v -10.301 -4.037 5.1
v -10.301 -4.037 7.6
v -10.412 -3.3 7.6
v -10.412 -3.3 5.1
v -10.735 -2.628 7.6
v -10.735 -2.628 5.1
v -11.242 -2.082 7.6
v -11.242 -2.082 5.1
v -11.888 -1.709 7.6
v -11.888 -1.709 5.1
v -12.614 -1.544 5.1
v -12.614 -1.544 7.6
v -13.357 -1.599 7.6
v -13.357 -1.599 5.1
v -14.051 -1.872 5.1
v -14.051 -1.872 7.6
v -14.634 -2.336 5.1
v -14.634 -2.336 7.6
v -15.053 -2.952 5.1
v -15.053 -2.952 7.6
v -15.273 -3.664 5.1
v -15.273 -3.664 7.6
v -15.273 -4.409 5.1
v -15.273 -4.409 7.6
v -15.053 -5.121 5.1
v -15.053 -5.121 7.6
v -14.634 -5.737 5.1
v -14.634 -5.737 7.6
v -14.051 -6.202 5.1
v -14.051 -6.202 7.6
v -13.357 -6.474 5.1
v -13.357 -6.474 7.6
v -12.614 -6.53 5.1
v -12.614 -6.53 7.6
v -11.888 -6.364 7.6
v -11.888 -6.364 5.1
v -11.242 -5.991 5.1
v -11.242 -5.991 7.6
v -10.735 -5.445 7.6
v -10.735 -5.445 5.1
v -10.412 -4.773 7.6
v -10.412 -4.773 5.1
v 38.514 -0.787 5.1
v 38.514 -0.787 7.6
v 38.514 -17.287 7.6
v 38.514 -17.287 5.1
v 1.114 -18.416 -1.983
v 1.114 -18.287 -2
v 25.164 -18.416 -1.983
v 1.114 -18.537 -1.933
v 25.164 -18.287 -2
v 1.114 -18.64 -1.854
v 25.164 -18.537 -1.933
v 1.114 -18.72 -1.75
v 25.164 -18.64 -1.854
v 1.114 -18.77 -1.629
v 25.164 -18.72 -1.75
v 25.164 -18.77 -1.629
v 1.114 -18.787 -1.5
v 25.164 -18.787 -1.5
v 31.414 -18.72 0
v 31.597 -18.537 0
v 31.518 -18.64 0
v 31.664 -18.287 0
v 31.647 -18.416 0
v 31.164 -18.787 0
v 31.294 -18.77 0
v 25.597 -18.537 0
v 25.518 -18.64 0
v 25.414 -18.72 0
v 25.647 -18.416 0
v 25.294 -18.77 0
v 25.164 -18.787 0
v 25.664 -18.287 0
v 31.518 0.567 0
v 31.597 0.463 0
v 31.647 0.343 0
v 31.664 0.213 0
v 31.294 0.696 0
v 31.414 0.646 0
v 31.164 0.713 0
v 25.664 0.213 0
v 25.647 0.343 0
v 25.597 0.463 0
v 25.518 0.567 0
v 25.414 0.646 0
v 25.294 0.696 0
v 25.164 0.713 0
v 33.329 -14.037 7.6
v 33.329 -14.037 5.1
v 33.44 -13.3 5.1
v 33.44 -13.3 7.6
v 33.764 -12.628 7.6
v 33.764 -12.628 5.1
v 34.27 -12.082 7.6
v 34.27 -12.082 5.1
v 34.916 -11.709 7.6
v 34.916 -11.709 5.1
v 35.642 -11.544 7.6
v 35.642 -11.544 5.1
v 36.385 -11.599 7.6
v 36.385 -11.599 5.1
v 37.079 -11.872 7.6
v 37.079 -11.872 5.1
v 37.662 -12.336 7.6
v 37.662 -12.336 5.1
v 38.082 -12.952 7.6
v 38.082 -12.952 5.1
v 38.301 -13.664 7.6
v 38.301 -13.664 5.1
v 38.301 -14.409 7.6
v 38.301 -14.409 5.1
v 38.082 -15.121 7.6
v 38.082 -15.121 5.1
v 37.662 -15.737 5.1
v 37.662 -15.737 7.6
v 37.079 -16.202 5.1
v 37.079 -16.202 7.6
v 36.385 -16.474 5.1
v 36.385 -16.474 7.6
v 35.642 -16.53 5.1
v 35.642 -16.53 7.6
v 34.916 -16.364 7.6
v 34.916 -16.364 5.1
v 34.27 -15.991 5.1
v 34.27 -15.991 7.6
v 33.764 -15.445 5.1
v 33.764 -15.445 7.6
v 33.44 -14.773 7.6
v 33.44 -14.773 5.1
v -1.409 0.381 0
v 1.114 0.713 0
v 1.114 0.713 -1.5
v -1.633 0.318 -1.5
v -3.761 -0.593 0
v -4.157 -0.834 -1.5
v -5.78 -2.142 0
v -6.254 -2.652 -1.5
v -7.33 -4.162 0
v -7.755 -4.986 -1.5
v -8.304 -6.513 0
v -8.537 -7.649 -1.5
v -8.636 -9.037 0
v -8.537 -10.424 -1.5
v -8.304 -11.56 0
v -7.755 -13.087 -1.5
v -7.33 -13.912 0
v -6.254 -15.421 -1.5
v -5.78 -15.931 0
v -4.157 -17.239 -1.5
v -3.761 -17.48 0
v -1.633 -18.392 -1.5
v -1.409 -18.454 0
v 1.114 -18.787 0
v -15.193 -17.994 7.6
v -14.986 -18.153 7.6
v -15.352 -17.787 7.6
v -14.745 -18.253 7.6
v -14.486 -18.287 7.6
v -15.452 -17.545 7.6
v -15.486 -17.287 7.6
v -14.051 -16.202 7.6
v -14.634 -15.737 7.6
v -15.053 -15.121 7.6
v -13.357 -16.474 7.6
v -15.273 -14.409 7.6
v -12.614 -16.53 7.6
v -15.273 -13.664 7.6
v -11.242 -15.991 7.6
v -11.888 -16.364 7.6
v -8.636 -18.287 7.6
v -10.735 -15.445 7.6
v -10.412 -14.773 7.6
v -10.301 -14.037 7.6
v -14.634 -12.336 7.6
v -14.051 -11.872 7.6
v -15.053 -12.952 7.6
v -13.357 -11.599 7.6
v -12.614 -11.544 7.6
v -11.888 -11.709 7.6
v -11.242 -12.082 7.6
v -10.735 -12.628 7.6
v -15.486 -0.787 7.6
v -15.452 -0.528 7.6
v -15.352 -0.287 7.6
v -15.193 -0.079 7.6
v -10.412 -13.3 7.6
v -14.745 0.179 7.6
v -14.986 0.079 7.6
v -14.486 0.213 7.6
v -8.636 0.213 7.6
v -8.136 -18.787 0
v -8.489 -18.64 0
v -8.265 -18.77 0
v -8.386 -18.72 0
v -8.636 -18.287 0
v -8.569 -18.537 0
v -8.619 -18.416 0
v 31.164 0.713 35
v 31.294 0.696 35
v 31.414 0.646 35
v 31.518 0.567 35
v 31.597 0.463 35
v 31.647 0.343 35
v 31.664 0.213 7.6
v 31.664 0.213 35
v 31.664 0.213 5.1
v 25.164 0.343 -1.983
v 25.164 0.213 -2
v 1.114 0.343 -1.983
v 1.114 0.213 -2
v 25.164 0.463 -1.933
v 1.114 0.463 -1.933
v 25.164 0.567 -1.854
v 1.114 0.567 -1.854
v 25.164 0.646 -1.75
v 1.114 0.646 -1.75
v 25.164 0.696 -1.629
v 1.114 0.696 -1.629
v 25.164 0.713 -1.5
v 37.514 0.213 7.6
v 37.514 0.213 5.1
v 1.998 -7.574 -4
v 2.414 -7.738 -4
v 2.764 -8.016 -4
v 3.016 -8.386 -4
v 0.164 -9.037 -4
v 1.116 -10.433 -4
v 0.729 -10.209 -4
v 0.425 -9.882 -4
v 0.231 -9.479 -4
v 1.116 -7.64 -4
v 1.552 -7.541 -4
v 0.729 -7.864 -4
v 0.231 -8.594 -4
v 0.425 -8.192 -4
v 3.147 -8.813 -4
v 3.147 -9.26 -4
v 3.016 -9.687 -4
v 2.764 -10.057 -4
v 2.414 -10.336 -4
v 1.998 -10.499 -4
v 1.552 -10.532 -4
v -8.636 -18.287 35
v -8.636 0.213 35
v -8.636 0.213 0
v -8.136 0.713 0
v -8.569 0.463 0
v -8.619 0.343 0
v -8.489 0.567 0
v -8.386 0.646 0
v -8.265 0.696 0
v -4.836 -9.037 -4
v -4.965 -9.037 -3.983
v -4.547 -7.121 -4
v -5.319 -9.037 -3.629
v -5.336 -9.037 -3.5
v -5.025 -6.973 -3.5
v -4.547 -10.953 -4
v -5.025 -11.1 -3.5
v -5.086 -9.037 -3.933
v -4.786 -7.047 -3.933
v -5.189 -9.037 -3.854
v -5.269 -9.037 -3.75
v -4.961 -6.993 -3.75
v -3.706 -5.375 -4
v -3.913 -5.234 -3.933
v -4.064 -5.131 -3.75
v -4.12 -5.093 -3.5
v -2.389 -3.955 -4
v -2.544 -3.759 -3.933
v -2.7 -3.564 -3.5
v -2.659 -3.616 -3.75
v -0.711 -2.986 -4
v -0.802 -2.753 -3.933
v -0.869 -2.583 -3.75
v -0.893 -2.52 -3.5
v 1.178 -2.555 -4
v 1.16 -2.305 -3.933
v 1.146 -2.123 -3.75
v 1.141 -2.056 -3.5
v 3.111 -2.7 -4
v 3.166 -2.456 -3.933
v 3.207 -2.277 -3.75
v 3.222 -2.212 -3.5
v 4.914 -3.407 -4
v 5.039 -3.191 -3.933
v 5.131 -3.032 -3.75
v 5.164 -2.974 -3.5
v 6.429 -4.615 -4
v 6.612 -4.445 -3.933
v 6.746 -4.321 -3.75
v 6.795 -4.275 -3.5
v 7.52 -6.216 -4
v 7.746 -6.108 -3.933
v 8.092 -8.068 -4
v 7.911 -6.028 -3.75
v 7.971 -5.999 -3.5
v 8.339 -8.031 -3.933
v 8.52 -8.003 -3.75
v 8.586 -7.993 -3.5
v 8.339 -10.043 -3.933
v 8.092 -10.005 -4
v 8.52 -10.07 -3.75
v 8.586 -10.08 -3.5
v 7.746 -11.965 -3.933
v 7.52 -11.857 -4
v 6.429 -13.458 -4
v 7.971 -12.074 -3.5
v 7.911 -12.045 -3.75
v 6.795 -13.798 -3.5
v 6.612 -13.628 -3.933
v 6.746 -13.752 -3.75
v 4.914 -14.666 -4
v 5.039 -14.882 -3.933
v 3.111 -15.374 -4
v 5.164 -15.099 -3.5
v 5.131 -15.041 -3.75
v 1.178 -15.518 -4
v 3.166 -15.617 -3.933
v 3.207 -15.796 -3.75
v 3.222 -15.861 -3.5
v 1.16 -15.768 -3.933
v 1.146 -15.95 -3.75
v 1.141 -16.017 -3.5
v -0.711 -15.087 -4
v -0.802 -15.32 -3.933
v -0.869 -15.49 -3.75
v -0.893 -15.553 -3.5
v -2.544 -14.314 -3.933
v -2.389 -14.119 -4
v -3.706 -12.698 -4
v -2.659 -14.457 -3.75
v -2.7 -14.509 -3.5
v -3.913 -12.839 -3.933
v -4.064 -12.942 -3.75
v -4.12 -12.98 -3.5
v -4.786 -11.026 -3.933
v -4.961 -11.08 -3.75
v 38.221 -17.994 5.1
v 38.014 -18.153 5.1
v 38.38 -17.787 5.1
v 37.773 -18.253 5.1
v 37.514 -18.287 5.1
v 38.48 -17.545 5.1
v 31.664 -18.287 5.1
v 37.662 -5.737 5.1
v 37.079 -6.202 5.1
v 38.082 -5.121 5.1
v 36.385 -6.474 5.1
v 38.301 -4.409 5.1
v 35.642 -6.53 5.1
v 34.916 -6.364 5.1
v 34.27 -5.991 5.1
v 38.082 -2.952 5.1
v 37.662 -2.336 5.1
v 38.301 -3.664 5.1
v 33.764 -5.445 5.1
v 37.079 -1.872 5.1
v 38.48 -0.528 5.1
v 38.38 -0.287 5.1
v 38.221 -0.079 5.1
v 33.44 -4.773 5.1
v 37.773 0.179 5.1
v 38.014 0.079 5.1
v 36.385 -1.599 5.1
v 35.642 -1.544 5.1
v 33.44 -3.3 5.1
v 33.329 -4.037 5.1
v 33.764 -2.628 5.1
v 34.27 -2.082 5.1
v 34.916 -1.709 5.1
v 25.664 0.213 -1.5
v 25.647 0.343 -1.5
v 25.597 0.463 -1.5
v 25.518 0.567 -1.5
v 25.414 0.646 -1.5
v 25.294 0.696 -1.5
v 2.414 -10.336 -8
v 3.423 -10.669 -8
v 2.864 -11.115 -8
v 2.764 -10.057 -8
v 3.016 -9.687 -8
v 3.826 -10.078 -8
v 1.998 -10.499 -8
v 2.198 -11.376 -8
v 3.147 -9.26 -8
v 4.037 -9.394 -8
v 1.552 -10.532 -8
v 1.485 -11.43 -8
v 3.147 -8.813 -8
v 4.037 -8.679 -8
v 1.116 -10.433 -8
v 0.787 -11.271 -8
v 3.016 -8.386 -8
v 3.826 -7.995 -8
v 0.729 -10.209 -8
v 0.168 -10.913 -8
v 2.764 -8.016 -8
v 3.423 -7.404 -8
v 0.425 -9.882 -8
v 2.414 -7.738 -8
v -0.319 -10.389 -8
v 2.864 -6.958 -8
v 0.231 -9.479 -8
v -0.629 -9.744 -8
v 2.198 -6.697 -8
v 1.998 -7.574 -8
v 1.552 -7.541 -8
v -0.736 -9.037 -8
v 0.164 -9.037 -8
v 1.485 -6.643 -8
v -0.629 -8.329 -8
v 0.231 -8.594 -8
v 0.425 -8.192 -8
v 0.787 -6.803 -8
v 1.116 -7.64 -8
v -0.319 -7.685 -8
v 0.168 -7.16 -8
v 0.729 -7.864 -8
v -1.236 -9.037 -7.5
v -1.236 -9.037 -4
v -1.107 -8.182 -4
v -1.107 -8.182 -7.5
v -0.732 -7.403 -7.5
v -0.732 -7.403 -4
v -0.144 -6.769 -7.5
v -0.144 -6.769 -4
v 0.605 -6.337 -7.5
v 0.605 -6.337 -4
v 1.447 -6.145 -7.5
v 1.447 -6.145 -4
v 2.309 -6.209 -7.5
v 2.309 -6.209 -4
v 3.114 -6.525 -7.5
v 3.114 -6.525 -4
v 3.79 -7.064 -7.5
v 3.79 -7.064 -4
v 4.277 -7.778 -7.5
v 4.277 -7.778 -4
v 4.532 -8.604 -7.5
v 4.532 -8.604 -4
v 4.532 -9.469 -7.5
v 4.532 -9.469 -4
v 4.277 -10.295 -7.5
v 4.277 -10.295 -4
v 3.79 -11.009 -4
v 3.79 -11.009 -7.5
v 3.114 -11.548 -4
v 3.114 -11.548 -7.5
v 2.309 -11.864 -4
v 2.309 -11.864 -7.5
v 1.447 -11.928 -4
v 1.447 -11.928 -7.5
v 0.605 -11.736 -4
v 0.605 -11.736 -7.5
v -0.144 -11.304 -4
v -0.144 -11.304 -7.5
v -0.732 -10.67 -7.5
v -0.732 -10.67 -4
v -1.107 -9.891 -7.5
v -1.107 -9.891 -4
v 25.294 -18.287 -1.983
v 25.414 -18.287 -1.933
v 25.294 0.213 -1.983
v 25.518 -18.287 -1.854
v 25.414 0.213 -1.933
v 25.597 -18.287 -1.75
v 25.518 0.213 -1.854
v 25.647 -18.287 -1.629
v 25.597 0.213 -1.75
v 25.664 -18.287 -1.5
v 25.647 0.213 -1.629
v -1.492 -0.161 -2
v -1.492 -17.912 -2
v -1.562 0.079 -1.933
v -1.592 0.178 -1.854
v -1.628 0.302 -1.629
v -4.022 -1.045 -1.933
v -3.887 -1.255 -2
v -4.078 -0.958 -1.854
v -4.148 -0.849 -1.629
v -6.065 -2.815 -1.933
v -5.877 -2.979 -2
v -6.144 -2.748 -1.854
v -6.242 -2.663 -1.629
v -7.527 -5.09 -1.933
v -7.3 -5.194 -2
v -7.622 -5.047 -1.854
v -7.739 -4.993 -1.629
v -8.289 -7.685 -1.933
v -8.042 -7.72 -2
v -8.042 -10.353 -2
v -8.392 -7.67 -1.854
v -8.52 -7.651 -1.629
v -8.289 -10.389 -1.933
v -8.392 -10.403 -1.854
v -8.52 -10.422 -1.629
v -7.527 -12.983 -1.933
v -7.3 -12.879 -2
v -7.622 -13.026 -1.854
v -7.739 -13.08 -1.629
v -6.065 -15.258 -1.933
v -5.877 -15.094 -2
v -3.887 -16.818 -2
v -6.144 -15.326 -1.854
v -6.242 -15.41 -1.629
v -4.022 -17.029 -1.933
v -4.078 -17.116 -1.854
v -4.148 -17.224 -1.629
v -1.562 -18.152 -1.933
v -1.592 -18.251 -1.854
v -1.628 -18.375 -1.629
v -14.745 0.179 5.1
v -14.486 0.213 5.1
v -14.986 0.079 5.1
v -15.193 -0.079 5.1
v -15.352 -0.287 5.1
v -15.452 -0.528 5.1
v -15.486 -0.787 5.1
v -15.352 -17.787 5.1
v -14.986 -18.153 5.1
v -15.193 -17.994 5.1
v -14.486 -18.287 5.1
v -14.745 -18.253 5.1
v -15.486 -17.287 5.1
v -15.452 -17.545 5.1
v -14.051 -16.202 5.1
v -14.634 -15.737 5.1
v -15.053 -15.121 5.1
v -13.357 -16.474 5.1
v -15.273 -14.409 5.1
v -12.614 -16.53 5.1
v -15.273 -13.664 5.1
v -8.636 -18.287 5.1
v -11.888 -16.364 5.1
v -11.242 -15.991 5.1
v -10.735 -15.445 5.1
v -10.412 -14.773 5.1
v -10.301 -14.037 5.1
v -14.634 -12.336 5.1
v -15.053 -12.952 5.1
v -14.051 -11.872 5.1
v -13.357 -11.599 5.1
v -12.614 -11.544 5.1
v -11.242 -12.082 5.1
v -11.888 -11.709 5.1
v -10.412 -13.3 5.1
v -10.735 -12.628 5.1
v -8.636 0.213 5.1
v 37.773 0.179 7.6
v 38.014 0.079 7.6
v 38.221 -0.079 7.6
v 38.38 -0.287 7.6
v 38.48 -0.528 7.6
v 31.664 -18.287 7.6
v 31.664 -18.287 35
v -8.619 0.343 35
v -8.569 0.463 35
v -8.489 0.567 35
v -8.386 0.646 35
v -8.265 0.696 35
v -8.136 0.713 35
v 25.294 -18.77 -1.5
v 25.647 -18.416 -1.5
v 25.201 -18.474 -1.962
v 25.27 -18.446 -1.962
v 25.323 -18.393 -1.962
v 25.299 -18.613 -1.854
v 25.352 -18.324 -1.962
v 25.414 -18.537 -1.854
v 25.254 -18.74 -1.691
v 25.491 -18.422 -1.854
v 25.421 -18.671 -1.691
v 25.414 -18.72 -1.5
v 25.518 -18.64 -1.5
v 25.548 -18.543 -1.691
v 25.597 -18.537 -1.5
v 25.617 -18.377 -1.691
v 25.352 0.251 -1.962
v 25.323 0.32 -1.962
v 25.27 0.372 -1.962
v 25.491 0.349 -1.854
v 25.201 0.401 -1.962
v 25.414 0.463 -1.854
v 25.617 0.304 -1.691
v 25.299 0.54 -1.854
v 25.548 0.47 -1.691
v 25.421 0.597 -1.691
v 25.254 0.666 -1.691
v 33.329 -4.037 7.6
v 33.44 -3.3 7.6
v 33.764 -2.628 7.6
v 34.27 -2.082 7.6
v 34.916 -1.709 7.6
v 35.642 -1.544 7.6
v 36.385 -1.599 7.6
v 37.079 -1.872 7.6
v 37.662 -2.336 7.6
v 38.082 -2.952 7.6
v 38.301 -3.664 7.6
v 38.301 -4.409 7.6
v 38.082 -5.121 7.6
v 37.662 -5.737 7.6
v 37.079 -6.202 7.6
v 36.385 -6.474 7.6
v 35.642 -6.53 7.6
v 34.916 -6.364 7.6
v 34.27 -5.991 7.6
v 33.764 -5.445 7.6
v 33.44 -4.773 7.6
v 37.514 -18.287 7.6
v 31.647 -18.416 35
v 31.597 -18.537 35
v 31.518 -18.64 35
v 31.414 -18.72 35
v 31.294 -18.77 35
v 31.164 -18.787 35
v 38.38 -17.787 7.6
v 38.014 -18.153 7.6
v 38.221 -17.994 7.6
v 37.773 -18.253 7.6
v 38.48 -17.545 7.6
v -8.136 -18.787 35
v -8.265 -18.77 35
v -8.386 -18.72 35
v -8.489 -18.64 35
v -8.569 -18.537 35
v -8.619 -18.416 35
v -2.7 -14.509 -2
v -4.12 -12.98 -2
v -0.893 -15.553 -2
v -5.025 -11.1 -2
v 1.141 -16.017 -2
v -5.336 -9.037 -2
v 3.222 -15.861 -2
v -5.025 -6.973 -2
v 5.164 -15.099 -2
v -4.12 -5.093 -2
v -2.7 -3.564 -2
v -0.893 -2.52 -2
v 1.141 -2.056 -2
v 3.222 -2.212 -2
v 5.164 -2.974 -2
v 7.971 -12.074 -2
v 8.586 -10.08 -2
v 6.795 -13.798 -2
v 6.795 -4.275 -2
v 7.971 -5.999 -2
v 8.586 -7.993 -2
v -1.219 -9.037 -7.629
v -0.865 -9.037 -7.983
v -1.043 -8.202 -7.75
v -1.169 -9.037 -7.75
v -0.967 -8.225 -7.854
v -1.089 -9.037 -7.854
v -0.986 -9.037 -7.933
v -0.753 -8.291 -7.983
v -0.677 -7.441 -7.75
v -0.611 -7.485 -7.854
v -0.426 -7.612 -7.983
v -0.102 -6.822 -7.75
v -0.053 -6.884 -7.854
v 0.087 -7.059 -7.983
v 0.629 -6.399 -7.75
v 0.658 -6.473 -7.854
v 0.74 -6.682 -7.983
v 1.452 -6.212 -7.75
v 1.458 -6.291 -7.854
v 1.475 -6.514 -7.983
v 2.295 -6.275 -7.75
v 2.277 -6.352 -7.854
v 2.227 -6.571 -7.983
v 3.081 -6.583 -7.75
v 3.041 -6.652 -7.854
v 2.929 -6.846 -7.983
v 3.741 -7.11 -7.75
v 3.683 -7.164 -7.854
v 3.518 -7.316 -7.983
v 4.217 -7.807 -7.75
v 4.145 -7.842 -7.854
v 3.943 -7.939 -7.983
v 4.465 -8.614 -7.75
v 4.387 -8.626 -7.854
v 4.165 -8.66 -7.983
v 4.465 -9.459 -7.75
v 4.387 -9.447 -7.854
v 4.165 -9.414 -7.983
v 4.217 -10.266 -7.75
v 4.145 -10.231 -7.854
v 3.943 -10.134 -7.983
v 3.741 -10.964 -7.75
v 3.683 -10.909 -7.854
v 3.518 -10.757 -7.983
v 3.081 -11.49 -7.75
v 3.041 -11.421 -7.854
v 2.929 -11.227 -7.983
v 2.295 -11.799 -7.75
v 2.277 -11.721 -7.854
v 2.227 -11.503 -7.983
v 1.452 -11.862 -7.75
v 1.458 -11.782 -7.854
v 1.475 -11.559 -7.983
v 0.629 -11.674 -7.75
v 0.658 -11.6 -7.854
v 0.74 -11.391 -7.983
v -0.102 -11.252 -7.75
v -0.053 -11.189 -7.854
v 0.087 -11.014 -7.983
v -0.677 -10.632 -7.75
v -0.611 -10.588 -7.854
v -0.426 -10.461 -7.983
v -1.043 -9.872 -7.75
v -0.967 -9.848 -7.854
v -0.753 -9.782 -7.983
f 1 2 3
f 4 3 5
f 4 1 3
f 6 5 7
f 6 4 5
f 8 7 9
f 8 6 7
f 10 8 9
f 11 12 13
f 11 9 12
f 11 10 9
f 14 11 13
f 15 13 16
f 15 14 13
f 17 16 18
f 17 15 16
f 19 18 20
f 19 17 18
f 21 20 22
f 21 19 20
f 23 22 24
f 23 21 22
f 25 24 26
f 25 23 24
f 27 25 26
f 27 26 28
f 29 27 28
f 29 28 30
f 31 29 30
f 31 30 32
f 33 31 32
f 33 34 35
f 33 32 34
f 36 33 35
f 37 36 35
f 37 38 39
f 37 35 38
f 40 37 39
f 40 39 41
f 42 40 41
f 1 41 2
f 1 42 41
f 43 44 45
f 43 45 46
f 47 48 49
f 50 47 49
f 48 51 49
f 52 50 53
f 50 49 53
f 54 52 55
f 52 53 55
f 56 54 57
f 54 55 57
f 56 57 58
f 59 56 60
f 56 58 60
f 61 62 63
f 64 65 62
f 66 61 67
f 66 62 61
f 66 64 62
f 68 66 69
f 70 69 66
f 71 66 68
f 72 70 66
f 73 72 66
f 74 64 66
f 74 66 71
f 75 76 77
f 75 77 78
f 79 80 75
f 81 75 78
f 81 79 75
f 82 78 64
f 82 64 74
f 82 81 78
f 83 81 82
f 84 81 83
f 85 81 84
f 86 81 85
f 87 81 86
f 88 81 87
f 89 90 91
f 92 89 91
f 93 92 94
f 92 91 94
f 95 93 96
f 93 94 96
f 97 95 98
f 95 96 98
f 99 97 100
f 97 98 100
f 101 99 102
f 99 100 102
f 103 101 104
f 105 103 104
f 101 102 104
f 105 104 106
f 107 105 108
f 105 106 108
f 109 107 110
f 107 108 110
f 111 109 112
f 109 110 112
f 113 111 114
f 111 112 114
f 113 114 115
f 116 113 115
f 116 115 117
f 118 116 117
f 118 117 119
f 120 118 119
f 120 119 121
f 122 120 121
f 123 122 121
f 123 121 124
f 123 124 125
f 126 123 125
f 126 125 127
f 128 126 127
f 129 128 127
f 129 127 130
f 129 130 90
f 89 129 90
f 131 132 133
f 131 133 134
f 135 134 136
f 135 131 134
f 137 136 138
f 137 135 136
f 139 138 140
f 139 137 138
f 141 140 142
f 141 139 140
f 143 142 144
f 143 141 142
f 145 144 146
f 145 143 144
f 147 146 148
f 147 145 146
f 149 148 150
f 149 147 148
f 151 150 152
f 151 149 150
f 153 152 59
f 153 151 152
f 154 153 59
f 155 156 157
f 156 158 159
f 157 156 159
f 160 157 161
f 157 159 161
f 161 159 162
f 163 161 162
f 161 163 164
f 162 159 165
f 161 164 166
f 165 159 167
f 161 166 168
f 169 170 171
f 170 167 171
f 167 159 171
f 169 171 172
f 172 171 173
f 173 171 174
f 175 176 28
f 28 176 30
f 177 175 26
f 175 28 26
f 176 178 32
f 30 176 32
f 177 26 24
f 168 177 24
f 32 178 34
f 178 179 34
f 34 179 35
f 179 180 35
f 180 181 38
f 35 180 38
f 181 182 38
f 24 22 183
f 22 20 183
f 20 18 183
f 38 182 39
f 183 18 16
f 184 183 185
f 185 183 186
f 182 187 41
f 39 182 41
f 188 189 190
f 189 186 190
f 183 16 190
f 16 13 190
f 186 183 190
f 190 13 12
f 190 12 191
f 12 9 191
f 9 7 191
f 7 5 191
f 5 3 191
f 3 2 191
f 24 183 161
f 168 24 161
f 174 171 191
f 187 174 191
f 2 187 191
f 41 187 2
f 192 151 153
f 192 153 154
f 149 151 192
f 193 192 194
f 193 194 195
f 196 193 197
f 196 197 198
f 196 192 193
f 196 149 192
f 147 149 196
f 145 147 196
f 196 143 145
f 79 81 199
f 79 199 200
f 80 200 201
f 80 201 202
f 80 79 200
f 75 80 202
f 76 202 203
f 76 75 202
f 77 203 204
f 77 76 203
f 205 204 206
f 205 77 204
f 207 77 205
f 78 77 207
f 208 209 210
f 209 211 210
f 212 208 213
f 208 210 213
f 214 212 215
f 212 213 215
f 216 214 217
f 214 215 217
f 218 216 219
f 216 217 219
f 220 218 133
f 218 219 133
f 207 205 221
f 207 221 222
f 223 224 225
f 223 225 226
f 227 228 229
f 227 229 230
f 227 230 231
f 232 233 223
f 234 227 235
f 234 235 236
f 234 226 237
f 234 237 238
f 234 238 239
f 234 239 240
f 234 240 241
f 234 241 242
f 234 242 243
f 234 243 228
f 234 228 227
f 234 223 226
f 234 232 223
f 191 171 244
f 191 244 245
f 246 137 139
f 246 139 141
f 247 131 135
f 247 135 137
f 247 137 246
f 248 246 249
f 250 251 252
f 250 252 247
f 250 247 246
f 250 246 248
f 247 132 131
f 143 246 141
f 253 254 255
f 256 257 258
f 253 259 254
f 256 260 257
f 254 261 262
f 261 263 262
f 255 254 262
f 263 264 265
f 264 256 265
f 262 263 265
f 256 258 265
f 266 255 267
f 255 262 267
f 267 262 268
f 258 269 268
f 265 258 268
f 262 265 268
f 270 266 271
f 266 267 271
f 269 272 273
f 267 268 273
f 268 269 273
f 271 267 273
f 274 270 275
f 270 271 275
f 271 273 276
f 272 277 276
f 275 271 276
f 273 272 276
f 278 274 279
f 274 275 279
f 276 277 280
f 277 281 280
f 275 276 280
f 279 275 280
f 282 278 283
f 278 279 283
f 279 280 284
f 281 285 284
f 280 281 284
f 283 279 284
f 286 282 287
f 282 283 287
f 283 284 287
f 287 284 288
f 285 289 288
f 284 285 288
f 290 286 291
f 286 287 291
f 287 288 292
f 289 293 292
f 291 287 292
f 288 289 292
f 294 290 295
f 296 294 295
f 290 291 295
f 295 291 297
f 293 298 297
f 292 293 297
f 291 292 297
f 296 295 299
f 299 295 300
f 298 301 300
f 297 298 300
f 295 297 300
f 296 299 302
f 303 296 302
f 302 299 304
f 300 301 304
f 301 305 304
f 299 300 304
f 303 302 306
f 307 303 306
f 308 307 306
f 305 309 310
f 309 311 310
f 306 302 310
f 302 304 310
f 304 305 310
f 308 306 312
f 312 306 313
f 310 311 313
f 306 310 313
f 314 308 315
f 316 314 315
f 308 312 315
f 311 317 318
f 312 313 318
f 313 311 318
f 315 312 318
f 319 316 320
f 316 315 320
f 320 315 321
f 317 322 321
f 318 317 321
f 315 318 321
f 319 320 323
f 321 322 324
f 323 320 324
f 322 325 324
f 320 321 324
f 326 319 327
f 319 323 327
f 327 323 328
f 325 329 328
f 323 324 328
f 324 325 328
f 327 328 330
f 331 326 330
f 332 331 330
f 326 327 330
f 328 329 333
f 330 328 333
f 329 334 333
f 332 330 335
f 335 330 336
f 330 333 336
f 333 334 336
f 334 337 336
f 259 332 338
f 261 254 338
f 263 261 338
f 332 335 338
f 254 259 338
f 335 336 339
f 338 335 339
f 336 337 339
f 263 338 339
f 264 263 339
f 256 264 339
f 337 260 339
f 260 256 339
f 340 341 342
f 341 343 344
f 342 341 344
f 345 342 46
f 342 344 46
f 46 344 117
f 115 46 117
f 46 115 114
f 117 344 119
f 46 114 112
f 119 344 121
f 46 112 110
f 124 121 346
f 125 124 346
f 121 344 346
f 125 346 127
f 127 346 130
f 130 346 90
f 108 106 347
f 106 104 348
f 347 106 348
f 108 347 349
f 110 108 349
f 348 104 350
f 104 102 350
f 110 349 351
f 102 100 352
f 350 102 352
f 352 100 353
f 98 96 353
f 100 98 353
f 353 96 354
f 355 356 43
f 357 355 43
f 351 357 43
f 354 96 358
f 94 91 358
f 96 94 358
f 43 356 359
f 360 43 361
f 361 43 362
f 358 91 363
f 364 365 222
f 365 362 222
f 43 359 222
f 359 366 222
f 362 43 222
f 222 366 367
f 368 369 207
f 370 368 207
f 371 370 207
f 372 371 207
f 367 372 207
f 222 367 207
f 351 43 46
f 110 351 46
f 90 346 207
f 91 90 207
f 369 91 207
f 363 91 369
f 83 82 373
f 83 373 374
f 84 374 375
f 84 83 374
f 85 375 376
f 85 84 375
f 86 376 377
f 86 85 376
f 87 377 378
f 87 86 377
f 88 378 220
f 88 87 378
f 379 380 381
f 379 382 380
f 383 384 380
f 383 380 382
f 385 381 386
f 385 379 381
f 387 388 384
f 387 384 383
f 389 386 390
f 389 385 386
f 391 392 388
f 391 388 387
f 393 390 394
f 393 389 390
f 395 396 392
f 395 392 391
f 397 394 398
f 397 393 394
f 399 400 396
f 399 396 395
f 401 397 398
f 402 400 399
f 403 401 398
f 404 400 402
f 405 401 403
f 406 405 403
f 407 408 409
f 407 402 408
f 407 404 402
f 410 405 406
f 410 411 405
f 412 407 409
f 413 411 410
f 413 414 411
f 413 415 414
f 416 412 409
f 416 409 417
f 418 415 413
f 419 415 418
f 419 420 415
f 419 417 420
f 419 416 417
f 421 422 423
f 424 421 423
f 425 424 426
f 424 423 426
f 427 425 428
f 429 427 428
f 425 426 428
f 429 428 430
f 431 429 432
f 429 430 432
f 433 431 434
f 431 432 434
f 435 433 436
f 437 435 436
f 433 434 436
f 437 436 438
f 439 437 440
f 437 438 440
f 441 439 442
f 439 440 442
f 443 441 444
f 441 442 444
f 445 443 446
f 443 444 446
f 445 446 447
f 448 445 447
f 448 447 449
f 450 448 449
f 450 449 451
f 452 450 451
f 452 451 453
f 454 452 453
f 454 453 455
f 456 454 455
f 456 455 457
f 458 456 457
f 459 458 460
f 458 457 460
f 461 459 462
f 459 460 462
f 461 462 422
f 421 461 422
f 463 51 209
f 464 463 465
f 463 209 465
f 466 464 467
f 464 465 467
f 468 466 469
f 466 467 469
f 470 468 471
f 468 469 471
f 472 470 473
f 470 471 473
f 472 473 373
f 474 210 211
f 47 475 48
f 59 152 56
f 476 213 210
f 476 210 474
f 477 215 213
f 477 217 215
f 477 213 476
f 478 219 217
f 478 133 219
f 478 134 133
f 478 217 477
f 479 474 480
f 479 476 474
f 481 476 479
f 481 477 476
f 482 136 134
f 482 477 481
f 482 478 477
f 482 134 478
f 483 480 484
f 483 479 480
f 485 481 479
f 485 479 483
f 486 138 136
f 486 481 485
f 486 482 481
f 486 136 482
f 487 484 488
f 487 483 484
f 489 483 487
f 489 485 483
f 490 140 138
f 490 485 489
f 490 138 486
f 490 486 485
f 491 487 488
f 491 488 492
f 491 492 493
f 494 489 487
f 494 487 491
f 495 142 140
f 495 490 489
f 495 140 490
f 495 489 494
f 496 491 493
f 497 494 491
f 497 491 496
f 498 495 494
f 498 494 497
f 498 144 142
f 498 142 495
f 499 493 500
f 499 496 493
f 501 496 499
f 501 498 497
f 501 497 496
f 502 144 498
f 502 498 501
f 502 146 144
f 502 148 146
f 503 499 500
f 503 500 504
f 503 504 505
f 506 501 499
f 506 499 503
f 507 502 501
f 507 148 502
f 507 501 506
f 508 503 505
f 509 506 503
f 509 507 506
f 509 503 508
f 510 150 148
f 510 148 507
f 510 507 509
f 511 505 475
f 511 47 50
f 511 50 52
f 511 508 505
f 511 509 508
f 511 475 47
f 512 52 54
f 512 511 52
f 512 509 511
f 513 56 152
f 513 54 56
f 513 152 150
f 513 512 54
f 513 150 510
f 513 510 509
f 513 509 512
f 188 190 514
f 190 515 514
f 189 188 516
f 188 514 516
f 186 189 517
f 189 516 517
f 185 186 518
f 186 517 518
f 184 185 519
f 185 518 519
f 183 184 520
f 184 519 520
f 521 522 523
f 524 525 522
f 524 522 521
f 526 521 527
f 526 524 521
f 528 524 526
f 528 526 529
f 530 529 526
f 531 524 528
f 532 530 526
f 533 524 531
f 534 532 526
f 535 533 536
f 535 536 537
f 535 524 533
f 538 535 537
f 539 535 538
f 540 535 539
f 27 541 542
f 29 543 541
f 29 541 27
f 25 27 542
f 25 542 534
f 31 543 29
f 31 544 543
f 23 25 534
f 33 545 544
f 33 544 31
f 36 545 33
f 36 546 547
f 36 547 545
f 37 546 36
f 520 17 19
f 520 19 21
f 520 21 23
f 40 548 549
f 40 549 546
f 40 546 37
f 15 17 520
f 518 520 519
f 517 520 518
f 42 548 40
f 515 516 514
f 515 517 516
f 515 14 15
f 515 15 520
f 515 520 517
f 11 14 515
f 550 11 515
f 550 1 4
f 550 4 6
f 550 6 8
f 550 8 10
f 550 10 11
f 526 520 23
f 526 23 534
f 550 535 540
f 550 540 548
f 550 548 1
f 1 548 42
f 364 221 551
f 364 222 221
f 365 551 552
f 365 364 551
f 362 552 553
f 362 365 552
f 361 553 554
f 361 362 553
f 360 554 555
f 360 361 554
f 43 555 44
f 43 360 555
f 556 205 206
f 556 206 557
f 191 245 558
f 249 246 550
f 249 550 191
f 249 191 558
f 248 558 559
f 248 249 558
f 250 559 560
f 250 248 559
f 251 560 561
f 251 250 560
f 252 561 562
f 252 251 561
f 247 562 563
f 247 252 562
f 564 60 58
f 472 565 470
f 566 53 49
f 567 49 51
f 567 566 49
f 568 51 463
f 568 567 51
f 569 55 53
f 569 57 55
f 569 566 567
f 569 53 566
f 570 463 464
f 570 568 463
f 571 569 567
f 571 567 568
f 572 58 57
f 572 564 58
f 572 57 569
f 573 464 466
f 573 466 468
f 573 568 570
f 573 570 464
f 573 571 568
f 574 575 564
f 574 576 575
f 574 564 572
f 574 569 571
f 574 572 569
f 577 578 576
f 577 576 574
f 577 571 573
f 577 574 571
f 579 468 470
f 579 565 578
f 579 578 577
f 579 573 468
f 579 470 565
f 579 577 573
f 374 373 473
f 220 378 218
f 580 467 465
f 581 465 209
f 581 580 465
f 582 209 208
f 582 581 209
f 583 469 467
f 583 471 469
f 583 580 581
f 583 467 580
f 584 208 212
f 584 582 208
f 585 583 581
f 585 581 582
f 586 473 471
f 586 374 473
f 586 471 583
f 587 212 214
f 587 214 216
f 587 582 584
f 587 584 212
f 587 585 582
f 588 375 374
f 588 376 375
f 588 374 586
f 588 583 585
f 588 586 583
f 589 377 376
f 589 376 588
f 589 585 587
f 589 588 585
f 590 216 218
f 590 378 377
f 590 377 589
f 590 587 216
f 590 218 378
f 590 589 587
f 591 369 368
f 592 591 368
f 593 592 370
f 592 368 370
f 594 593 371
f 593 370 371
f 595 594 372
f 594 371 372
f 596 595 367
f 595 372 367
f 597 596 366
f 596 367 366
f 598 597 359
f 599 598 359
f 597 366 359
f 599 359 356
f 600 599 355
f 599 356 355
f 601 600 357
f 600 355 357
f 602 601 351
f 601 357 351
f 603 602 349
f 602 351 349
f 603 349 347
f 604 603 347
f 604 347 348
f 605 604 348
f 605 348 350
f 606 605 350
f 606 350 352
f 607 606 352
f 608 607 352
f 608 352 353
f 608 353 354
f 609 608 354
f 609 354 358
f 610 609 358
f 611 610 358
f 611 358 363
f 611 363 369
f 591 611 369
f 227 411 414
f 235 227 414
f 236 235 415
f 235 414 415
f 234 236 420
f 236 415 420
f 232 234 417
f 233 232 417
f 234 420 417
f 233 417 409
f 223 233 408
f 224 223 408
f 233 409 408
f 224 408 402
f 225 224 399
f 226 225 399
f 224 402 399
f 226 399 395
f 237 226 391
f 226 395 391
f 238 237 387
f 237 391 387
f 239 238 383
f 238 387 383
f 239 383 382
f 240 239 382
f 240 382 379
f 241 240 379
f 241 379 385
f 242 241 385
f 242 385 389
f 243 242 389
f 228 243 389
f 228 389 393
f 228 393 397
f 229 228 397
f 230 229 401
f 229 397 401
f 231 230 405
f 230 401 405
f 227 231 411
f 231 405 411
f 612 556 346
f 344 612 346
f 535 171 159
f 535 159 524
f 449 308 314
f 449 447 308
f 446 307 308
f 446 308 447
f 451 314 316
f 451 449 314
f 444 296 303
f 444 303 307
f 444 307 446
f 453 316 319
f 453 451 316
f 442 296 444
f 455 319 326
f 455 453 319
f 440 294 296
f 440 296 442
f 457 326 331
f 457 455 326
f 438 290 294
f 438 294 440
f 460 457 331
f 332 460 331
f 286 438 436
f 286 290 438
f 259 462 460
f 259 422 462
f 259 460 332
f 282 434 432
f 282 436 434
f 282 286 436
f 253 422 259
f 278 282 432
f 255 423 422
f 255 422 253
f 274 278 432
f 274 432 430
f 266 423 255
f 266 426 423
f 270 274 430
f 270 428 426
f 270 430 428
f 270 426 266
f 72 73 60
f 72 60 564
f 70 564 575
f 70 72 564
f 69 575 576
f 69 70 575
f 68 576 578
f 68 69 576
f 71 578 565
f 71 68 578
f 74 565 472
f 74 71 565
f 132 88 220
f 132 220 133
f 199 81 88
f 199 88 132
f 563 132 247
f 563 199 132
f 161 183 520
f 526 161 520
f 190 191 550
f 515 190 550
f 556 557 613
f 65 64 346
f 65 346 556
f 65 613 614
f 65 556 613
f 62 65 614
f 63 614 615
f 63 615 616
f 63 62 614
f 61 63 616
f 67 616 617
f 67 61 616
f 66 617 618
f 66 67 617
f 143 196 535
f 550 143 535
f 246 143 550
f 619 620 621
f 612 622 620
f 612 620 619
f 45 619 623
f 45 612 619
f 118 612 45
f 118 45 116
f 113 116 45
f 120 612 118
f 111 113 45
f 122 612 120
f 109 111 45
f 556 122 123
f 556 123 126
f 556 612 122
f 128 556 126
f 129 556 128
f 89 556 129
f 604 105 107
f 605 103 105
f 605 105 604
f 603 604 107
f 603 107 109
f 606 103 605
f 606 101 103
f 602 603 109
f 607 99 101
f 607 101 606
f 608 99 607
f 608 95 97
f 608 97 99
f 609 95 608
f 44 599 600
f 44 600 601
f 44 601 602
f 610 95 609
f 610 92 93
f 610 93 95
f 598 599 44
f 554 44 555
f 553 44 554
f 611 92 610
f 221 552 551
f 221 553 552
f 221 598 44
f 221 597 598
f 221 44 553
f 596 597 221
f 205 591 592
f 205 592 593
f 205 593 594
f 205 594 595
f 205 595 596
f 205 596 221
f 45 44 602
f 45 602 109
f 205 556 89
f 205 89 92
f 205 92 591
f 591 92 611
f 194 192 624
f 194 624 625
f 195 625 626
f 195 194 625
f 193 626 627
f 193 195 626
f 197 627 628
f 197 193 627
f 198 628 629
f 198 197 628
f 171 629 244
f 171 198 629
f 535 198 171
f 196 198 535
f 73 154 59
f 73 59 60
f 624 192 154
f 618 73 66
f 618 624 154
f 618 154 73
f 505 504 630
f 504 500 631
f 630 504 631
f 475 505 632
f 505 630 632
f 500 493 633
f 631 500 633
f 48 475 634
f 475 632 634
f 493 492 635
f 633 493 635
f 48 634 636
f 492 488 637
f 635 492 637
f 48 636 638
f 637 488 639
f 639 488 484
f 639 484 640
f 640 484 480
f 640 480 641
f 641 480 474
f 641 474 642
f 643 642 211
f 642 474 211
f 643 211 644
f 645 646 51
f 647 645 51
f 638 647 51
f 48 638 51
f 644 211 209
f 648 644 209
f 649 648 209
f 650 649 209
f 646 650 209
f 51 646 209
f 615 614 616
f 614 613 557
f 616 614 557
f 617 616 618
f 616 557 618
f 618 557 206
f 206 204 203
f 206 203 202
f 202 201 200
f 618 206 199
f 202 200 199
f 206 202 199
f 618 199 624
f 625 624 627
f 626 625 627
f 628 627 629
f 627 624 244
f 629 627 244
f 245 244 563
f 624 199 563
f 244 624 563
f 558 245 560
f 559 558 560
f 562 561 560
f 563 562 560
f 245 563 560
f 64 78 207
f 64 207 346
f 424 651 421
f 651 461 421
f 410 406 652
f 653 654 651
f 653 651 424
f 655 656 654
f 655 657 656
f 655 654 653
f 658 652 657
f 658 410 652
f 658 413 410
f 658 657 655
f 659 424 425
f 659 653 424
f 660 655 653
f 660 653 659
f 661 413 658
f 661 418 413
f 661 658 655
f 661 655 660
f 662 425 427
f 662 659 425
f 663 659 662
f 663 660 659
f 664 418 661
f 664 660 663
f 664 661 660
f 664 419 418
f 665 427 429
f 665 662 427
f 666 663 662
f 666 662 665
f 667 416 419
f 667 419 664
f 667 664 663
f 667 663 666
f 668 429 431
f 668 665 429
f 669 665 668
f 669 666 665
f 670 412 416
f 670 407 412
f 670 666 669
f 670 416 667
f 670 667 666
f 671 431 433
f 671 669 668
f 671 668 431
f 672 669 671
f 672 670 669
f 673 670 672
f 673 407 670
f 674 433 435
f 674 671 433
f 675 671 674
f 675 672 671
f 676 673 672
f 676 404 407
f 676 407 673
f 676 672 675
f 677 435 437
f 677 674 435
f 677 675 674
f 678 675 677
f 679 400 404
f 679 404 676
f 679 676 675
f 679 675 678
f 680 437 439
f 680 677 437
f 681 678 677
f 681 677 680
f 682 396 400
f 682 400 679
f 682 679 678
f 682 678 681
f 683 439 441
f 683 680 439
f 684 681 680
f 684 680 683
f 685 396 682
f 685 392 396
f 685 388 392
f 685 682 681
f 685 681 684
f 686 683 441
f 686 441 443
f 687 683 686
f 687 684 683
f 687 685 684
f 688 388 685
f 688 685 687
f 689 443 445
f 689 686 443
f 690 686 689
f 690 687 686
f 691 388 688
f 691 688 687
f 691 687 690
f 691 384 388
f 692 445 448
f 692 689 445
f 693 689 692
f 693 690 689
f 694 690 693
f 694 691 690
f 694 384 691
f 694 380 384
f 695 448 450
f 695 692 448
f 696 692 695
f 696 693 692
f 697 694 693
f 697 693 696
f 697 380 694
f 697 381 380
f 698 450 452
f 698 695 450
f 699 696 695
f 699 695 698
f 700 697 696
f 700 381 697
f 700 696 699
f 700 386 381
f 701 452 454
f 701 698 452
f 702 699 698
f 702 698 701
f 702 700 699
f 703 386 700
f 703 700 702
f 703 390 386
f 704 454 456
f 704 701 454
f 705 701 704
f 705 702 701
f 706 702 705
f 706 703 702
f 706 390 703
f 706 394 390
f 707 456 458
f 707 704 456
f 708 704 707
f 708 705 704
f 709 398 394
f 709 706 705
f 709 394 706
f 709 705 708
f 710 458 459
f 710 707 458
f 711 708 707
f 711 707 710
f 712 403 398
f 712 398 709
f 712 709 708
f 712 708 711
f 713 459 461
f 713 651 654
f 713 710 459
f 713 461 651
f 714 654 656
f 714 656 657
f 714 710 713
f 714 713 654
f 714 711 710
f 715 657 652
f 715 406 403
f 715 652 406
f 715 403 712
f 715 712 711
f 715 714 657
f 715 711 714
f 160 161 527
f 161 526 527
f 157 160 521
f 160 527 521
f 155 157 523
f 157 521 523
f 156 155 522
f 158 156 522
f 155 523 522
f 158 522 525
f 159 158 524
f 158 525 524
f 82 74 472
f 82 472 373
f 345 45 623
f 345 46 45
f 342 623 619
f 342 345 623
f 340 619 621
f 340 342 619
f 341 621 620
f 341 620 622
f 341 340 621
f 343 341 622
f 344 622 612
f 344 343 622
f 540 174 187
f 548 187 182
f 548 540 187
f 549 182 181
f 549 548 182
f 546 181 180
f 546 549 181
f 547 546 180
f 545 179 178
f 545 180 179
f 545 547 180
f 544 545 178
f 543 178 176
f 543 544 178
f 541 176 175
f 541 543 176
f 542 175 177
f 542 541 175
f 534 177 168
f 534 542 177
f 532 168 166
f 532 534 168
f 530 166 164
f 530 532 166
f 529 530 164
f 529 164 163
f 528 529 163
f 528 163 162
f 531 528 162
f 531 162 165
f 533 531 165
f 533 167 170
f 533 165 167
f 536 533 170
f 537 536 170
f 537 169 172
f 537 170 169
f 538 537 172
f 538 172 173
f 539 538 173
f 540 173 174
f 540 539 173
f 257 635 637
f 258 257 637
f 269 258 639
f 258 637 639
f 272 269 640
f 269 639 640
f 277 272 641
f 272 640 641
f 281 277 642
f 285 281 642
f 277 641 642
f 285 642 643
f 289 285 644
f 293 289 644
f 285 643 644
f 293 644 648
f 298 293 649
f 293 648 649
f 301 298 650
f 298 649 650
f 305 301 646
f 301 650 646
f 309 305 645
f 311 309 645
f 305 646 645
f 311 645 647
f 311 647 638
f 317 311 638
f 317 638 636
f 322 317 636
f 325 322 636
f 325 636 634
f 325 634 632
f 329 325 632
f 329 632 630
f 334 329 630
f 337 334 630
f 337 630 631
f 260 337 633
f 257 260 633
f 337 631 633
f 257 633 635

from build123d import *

# Parameters (mm, degrees)
EXTRUDE_1_DEPTH     = 35
EXTRUDE_2_DEPTH     = 2
SKETCH_10_R         = 7
EXTRUDE_6_DEPTH     = 2
SKETCH_15_R         = 2.9
EXTRUDE_7_DEPTH     = 4
SKETCH_16_R         = 1.5
CUT_EXTRUDE_1_DEPTH = 4
SKETCH_17_W         = 2.5
SKETCH_17_H         = 18.5
EXTRUDE_9_DEPTH     = 6.85
SKETCH_19_R         = 2.5
CUT_EXTRUDE_2_DEPTH = 30.9
FILLET_1_R          = 1
FILLET_2_R          = 1
FILLET_3_R          = 1
FILLET_4_R          = 1
FILLET_5_R          = 0.5
FILLET_6_R          = 0.5
FILLET_7_R          = 0.5


with BuildPart() as part:
    # 草图1 → 凸台-拉伸1 (new body)
    with BuildSketch(Plane.XY):
        with BuildLine():
            Line((-8.135874765, 0.713393676), (31.164125235, 0.713393676))
            ThreePointArc((31.164125235, 0.713393676), (31.517678626, 0.566947067), (31.664125235, 0.213393676))
            Line((31.664125235, 0.213393676), (31.664125235, -18.286606324))
            ThreePointArc((31.664125235, -18.286606324), (31.517678626, -18.640159714), (31.164125235, -18.786606324))
            Line((31.164125235, -18.786606324), (-8.135874765, -18.786606324))
            ThreePointArc((-8.135874765, -18.786606324), (-8.489428155, -18.640159714), (-8.635874765, -18.286606324))
            Line((-8.635874765, -18.286606324), (-8.635874765, 0.213393676))
            ThreePointArc((-8.635874765, 0.213393676), (-8.489428155, 0.566947067), (-8.135874765, 0.713393676))
        make_face()
    extrude(amount=EXTRUDE_1_DEPTH)

    # 草图2 → 凸台-拉伸2 (add)
    with BuildSketch(Plane(origin=(0, 0, 0), x_dir=(-1, 0, 0), z_dir=(0, 0, -1))):
        with BuildLine():
            Line((-25.664125235, -18.286606324), (-25.664125235, 0.213393676))
            ThreePointArc((-25.664125235, 0.213393676), (-25.517678626, 0.566947067), (-25.164125235, 0.713393676))
            Line((-25.164125235, 0.713393676), (-1.114125235, 0.713393676))
            ThreePointArc((-1.114125235, 0.713393676), (8.635874765, -9.036606324), (-1.114125235, -18.786606324))
            Line((-1.114125235, -18.786606324), (-25.164125235, -18.786606324))
            ThreePointArc((-25.164125235, -18.786606324), (-25.517678626, -18.640159714), (-25.664125235, -18.286606324))
        make_face()
    extrude(amount=EXTRUDE_2_DEPTH)

    # 草图10 → 凸台-拉伸6 (add)
    with BuildSketch(Plane(origin=(0, 0, -2), x_dir=(-1, 0, 0), z_dir=(0, 0, -1))):
        with Locations((-1.664125235, -9.036606324)):
            Circle(SKETCH_10_R)
    extrude(amount=EXTRUDE_6_DEPTH)

    # 草图15 → 凸台-拉伸7 (add)
    with BuildSketch(Plane(origin=(0, 0, -4), x_dir=(-1, 0, 0), z_dir=(0, 0, -1))):
        with Locations((-1.664125235, -9.036606324)):
            Circle(SKETCH_15_R)
    extrude(amount=EXTRUDE_7_DEPTH)

    # 草图16 → 切除-拉伸1 (cut)
    with BuildSketch(Plane(origin=(0, 0, -8), x_dir=(-1, 0, 0), z_dir=(0, 0, -1))):
        with Locations((-1.664125235, -9.036606324)):
            Circle(SKETCH_16_R)
    extrude(amount=-CUT_EXTRUDE_1_DEPTH, mode=Mode.SUBTRACT)

    # 草图17 → 凸台-拉伸9 (add)
    with BuildSketch(Plane(origin=(31.664125235, 0, 0), x_dir=(0, 0, -1), z_dir=(1, 0, 0))):
        with Locations((-6.35, -9.036606324)):
            Rectangle(SKETCH_17_W, SKETCH_17_H)
    extrude_9 = extrude(amount=EXTRUDE_9_DEPTH)

    # 草图19 → 切除-拉伸2 (cut, through all)
    with BuildSketch(Plane(origin=(0, 0, 5.1), x_dir=(-1, 0, 0), z_dir=(0, 0, -1))):
        with Locations((-35.829125235, -4.036606324)):
            Circle(SKETCH_19_R)
        with Locations((-35.829125235, -14.036606324)):
            Circle(SKETCH_19_R)
    cut_extrude_2 = extrude(amount=-CUT_EXTRUDE_2_DEPTH, mode=Mode.SUBTRACT)

    # 镜向3: 凸台-拉伸9, 切除-拉伸2 across plane
    add(extrude_9.mirror(Plane.ZY.offset(-11.514125235)))
    add(cut_extrude_2.mirror(Plane.ZY.offset(-11.514125235)), mode=Mode.SUBTRACT)

    # 圆角1
    fillet_1_edges = [part.edges().sort_by_distance(p)[0] for p in [
        (38.514125235, 0.213393676, 6.35),
    ]]
    fillet(fillet_1_edges, radius=FILLET_1_R)

    # 圆角2
    fillet_2_edges = [part.edges().sort_by_distance(p)[0] for p in [
        (38.514125235, -18.286606324, 6.35),
    ]]
    fillet(fillet_2_edges, radius=FILLET_2_R)

    # 圆角3
    fillet_3_edges = [part.edges().sort_by_distance(p)[0] for p in [
        (-15.485874765, 0.213393676, 6.35),
    ]]
    fillet(fillet_3_edges, radius=FILLET_3_R)

    # 圆角4
    fillet_4_edges = [part.edges().sort_by_distance(p)[0] for p in [
        (-15.485874765, -18.286606324, 6.35),
    ]]
    fillet(fillet_4_edges, radius=FILLET_4_R)

    # 圆角5
    fillet_5_edges = [part.edges().sort_by_distance(p)[0] for p in [
        (4.564125235, -9.036606324, -8),
    ]]
    fillet(fillet_5_edges, radius=FILLET_5_R)

    # 圆角6
    fillet_6_edges = [part.edges().sort_by_distance(p)[0] for p in [
        (8.664125235, -9.036606324, -4),
    ]]
    fillet(fillet_6_edges, radius=FILLET_6_R)

    # 圆角7
    fillet_7_edges = [part.edges().sort_by_distance(p)[0] for p in [
        (13.139125235, 0.713393676, -2),
        (25.664125235, -9.036606324, -2),
        (13.139125235, -18.786606324, -2),
        (-8.635874765, -9.036606324, -2),
    ]]
    fillet(fillet_7_edges, radius=FILLET_7_R)


solid = part.part
